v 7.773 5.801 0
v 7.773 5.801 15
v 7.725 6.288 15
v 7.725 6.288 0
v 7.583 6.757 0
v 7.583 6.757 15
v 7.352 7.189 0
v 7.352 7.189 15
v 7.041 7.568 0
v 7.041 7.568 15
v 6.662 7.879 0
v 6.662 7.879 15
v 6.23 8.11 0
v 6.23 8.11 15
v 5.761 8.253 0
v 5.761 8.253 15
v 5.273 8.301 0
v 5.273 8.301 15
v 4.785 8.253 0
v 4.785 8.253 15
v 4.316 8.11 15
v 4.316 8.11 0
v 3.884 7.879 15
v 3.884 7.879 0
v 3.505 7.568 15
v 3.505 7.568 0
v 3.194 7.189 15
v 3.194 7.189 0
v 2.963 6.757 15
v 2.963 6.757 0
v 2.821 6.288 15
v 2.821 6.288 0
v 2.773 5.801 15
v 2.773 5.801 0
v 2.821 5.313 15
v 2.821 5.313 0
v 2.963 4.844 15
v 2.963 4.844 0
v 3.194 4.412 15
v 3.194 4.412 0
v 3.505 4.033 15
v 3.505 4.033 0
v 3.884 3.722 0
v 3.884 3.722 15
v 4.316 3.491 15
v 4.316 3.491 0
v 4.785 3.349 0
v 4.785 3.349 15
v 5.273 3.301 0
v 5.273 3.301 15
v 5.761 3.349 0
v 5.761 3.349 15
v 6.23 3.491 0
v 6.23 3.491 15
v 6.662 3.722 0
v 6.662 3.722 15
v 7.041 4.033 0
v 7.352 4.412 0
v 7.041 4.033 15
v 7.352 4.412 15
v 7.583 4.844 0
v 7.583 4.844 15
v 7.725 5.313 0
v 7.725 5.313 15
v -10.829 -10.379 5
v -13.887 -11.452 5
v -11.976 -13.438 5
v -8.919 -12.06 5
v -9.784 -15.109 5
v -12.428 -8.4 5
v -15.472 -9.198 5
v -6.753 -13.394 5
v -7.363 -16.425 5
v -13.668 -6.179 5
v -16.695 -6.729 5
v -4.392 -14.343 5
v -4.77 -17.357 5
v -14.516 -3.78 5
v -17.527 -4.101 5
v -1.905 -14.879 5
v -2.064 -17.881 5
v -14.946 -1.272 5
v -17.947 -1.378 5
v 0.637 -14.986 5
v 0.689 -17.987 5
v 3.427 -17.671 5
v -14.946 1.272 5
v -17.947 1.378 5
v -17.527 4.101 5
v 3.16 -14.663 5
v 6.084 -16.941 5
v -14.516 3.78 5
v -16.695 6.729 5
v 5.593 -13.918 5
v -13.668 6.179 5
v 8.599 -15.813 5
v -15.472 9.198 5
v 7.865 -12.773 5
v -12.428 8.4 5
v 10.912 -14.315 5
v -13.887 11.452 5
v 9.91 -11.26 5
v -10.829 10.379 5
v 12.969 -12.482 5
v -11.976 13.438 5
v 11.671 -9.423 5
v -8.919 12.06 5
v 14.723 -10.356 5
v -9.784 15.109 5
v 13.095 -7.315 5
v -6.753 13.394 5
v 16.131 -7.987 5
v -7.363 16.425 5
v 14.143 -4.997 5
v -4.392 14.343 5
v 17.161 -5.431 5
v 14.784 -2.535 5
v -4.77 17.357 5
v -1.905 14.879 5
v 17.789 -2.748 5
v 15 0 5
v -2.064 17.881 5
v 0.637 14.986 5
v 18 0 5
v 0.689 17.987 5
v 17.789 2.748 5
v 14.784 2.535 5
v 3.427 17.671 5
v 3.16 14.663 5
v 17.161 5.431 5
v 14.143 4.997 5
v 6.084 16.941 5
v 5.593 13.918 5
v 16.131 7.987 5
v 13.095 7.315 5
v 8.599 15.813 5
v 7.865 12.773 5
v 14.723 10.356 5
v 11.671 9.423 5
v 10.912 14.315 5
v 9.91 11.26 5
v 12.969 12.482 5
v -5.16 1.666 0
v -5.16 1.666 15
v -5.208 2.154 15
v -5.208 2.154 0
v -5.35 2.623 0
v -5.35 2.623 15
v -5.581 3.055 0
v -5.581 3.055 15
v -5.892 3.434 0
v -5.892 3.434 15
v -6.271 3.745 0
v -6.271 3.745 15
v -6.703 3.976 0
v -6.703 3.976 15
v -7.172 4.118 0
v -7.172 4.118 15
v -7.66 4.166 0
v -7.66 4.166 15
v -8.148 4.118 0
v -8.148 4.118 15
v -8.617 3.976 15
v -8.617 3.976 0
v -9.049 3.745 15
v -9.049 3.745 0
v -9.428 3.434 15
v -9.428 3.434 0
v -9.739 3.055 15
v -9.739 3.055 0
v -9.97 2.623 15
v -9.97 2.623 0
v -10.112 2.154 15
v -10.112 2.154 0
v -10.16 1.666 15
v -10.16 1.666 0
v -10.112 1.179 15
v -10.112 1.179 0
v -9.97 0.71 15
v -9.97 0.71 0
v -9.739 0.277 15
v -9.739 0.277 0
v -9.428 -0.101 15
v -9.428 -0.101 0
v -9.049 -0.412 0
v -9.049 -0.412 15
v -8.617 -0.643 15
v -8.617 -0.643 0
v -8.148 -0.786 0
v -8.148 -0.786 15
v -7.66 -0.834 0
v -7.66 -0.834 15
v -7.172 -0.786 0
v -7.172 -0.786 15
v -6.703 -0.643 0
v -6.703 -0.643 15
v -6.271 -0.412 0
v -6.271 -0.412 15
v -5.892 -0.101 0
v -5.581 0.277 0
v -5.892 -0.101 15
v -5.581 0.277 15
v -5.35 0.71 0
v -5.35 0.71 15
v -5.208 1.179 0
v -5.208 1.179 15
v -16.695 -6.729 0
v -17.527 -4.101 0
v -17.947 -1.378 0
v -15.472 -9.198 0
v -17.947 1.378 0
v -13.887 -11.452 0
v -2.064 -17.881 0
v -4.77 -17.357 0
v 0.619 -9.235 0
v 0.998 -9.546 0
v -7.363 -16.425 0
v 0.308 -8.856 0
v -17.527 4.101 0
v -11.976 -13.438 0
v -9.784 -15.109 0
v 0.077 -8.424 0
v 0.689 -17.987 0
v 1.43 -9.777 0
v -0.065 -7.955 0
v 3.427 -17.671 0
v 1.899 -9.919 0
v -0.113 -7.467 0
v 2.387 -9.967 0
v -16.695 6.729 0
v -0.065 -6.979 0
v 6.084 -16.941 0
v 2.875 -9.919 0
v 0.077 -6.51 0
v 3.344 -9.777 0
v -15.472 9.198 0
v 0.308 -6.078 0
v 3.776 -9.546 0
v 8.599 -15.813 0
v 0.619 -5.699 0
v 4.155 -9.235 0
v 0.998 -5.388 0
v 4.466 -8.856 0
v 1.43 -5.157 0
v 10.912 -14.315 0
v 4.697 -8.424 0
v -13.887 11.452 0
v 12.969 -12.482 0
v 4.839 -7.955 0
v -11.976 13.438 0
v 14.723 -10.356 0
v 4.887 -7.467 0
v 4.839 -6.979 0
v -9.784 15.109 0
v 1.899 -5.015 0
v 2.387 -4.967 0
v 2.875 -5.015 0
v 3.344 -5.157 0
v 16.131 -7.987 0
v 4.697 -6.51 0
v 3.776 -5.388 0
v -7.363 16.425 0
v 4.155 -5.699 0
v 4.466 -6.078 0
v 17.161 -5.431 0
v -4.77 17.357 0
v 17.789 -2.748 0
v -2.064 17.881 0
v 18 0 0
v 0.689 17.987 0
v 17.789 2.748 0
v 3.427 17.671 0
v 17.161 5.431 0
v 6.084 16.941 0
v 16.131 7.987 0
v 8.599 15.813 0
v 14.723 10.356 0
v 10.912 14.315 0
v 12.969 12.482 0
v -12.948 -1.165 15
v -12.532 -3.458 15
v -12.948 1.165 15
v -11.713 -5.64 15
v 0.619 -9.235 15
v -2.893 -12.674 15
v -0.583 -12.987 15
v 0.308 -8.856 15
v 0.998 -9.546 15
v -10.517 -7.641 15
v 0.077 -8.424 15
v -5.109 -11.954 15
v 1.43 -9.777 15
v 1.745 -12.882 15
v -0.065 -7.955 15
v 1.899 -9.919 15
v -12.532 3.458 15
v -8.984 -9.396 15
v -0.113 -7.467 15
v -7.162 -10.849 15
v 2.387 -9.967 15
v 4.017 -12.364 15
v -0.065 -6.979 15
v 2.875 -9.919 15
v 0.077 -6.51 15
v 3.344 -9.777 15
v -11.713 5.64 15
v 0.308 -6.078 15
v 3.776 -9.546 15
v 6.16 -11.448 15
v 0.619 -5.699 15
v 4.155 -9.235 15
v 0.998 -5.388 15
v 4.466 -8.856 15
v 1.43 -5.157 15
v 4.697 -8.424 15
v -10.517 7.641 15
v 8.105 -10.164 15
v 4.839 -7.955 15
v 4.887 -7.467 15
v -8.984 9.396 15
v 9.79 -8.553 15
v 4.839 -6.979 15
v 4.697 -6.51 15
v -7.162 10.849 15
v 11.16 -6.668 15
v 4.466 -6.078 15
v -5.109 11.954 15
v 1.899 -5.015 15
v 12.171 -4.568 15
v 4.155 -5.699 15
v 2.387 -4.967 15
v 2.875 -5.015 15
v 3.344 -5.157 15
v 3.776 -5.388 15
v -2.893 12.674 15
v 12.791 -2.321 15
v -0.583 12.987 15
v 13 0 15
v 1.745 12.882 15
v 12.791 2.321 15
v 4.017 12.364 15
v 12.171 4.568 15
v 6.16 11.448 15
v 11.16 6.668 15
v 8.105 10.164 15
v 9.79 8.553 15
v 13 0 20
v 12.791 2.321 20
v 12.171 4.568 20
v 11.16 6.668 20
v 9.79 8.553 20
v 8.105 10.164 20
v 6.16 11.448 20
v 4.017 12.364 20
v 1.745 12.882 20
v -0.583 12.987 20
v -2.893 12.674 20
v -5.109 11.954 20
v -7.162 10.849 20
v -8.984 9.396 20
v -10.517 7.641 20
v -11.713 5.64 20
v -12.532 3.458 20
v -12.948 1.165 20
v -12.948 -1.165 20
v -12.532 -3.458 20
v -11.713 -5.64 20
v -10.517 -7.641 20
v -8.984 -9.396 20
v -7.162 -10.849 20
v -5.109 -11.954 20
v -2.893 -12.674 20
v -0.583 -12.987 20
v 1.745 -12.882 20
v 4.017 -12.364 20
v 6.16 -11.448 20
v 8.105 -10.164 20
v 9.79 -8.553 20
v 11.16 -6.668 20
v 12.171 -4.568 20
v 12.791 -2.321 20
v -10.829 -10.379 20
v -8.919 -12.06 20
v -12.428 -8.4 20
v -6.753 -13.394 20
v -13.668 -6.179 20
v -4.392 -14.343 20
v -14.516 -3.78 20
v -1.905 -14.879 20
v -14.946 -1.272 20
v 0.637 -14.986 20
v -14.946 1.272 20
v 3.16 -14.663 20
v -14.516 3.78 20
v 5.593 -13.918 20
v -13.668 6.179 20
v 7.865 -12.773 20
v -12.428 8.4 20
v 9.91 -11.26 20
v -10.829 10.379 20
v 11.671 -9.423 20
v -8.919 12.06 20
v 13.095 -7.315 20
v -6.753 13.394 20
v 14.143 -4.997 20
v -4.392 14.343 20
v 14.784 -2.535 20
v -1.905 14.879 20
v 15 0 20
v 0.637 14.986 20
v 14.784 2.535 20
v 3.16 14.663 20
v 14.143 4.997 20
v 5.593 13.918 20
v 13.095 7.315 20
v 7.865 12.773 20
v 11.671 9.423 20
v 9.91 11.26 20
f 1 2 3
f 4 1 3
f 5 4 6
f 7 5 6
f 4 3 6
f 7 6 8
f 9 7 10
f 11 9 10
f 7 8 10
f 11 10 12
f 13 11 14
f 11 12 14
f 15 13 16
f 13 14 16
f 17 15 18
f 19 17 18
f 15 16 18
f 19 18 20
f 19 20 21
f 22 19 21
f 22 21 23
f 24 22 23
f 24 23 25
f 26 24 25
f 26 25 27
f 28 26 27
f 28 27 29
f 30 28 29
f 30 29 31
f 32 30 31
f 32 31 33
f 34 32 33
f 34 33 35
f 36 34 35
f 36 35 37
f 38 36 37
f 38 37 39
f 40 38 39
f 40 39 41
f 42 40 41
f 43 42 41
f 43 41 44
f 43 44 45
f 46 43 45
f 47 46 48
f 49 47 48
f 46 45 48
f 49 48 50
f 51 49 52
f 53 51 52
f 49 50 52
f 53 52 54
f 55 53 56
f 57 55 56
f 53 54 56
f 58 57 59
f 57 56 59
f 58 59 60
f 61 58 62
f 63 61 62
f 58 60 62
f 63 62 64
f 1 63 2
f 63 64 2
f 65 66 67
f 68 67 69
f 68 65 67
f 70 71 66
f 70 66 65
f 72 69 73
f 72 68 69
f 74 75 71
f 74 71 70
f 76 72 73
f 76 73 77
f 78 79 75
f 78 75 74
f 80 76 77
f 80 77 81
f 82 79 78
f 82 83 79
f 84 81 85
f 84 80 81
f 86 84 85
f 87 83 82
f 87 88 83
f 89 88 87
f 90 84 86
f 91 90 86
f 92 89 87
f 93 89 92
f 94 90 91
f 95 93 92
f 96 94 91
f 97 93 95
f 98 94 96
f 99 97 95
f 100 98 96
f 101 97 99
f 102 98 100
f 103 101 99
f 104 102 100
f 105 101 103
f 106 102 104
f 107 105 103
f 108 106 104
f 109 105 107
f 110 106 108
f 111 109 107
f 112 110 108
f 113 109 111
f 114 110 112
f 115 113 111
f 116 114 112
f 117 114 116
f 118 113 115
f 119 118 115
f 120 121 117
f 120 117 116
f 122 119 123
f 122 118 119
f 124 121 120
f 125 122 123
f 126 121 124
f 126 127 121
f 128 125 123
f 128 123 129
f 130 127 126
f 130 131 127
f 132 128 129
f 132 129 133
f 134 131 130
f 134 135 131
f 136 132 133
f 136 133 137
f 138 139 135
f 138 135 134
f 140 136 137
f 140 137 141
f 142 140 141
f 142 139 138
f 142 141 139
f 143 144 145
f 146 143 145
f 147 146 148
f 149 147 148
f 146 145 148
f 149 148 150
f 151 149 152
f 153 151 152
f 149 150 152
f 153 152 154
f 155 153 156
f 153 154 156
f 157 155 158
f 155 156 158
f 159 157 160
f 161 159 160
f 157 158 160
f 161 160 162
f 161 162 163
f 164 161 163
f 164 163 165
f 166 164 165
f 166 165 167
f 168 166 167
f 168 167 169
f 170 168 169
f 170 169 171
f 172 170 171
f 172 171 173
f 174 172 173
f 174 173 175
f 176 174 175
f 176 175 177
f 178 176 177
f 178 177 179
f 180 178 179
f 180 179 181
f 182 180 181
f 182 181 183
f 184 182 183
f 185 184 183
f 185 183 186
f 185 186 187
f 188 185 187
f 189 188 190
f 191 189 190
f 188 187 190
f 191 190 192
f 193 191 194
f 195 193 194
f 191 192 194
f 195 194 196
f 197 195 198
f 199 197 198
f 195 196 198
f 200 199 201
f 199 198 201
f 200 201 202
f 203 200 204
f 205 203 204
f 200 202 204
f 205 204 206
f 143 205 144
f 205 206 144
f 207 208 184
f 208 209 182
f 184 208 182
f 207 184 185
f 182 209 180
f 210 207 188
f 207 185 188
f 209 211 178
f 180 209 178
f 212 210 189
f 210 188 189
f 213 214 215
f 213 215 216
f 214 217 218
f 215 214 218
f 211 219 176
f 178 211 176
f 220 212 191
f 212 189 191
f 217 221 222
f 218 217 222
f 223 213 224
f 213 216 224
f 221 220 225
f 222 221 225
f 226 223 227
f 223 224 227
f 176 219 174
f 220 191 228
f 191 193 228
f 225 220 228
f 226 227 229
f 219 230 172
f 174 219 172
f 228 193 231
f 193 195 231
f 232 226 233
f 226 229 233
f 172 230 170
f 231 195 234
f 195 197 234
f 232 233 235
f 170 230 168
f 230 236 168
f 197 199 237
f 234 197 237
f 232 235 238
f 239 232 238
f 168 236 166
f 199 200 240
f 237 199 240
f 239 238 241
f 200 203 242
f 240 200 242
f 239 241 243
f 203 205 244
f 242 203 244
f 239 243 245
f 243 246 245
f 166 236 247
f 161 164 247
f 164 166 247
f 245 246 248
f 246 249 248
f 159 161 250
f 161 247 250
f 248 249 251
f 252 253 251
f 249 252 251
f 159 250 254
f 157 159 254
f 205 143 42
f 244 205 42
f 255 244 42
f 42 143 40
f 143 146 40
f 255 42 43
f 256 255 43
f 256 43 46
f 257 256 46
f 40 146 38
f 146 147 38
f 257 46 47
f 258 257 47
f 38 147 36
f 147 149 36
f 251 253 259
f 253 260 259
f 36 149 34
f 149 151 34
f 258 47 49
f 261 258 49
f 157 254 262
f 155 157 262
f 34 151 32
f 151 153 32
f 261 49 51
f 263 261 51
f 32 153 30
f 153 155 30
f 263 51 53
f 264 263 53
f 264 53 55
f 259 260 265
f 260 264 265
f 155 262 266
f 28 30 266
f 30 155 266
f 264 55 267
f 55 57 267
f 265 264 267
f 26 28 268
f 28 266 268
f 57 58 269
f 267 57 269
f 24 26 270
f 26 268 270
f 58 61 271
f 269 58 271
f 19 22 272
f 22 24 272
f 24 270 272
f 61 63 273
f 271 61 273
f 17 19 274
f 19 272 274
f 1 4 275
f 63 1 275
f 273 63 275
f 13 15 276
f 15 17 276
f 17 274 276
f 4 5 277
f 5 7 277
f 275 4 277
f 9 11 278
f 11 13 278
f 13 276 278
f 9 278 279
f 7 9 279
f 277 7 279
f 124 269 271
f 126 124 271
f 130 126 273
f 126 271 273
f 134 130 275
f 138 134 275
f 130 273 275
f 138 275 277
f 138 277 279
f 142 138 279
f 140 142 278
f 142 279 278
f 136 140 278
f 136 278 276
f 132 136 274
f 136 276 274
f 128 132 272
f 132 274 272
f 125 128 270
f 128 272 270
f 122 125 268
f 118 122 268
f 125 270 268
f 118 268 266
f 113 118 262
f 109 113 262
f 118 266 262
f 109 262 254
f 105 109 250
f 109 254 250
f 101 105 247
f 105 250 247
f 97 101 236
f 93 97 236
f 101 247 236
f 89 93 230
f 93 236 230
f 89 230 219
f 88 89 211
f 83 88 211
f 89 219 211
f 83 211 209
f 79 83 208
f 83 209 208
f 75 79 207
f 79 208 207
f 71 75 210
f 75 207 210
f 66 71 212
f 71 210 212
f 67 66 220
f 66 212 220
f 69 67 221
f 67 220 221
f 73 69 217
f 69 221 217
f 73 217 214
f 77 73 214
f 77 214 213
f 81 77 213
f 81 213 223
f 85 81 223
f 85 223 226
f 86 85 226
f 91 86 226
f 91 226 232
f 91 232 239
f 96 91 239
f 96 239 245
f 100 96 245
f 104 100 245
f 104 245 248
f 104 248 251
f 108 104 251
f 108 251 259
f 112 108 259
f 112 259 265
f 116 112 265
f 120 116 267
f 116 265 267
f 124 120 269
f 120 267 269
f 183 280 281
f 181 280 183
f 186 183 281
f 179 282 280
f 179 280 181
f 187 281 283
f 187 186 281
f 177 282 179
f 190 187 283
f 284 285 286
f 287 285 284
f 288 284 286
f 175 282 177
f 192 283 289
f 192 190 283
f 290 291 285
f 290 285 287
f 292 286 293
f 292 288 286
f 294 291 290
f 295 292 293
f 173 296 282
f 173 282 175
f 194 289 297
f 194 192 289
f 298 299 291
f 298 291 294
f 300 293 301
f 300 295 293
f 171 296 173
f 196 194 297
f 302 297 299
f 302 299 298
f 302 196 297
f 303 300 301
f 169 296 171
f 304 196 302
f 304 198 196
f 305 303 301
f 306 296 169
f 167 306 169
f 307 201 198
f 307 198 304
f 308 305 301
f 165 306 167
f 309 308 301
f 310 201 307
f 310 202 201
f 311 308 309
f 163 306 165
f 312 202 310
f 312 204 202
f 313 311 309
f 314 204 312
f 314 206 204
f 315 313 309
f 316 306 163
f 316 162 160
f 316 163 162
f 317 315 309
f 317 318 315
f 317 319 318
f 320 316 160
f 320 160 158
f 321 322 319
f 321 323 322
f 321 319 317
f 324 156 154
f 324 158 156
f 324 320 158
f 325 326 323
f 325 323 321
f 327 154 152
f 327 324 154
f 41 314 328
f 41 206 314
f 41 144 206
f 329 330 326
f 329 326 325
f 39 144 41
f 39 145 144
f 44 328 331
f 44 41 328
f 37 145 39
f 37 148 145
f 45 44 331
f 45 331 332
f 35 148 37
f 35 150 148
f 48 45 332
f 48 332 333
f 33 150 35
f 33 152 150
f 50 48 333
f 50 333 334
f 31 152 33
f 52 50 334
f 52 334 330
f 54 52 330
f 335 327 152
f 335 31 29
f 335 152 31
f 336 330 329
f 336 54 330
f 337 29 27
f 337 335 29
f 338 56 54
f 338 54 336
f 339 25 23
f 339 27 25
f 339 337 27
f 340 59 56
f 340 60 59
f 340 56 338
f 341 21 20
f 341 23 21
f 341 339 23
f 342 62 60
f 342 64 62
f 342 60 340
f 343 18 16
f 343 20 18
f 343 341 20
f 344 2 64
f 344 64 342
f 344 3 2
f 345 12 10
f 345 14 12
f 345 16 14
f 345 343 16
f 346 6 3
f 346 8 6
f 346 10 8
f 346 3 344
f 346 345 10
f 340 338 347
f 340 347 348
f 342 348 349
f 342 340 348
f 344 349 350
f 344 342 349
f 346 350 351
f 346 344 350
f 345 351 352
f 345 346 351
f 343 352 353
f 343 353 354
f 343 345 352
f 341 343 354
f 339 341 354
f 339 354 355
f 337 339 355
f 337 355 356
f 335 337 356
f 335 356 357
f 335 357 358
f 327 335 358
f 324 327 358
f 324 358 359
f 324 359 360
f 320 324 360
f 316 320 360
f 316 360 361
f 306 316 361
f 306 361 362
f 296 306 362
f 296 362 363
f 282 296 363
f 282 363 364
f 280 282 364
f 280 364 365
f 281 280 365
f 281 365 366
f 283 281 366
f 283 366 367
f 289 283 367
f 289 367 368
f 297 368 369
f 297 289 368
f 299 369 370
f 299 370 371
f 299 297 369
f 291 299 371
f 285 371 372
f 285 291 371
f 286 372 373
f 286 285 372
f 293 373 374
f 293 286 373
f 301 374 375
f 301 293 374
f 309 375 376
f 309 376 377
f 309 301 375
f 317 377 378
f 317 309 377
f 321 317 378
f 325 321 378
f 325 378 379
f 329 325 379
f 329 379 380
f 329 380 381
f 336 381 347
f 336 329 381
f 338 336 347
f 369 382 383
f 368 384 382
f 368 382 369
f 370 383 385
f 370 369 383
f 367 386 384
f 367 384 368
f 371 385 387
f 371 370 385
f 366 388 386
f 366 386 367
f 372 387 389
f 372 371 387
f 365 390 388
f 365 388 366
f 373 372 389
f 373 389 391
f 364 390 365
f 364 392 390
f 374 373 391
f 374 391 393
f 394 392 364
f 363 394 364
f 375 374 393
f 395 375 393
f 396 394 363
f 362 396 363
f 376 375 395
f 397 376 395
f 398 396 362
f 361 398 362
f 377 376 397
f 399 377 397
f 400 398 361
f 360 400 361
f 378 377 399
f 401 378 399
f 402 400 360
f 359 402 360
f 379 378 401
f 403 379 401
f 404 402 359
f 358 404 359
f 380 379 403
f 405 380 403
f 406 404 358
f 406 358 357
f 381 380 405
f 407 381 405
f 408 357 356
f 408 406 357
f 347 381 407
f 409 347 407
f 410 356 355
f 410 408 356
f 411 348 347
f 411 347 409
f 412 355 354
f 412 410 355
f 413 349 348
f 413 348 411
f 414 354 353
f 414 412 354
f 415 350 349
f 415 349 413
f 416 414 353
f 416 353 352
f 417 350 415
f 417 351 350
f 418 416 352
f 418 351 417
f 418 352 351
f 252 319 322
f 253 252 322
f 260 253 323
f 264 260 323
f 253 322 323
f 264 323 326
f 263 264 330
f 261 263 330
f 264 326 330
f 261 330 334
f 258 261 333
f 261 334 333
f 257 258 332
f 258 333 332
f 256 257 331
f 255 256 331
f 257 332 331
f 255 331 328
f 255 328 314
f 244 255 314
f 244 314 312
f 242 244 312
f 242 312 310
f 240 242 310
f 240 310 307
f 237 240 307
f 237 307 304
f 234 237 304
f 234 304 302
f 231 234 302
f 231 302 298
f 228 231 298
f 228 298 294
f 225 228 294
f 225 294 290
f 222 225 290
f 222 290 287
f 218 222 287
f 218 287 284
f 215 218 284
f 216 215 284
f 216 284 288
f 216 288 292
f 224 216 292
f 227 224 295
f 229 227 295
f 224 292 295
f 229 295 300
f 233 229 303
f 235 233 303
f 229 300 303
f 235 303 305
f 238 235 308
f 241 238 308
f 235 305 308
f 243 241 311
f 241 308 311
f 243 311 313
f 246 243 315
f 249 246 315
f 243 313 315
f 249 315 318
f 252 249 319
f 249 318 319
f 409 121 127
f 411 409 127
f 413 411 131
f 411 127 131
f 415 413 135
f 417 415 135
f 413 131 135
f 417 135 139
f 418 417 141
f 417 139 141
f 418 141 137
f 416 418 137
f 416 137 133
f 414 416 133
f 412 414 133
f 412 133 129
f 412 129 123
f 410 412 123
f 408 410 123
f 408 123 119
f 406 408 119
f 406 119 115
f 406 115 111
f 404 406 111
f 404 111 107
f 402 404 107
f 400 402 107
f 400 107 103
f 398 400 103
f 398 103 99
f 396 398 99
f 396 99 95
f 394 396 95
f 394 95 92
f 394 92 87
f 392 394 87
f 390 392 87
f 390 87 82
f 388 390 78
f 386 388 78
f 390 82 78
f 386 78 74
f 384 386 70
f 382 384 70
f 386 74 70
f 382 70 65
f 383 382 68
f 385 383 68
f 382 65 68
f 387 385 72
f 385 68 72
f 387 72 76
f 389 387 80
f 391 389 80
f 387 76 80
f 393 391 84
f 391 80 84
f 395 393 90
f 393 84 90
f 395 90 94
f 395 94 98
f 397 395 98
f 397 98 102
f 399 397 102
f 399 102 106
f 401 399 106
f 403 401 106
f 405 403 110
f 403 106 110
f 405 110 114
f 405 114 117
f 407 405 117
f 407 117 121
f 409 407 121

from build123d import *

# Parameters (mm, degrees)
SKETCH1_R           = 18
SKETCH1_R_2         = 15
BOSS_EXTRUDE1_DEPTH = 5
SKETCH1_3_R         = 15
SKETCH1_3_R_2       = 13
BOSS_EXTRUDE2_DEPTH = 20
SKETCH1_4_R         = 13
BOSS_EXTRUDE3_DEPTH = 15
SKETCH2_R           = 2.5
CUT_EXTRUDE1_DEPTH  = 30.546573405


with BuildPart() as part:
    # Sketch1 → Boss-Extrude1 (new body)
    with BuildSketch(Plane.XY):
        Circle(SKETCH1_R)
        Circle(SKETCH1_R_2, mode=Mode.SUBTRACT)
    extrude(amount=BOSS_EXTRUDE1_DEPTH)

    # Sketch1<3> → Boss-Extrude2 (add)
    with BuildSketch(Plane.XY):
        Circle(SKETCH1_3_R)
        Circle(SKETCH1_3_R_2, mode=Mode.SUBTRACT)
    extrude(amount=BOSS_EXTRUDE2_DEPTH)

    # Sketch1<4> → Boss-Extrude3 (add)
    with BuildSketch(Plane.XY):
        Circle(SKETCH1_4_R)
    extrude(amount=BOSS_EXTRUDE3_DEPTH)

    # Sketch2 → Cut-Extrude1 (cut, through all)
    with BuildSketch(Plane.XY.offset(15)):
        with Locations((-7.66, 1.666394077)):
            Circle(SKETCH2_R)
        with Locations((5.273139603, 5.800557555)):
            Circle(SKETCH2_R)
        with Locations((2.386860397, -7.466951631)):
            Circle(SKETCH2_R)
    extrude(amount=-CUT_EXTRUDE1_DEPTH, mode=Mode.SUBTRACT)


solid = part.part
